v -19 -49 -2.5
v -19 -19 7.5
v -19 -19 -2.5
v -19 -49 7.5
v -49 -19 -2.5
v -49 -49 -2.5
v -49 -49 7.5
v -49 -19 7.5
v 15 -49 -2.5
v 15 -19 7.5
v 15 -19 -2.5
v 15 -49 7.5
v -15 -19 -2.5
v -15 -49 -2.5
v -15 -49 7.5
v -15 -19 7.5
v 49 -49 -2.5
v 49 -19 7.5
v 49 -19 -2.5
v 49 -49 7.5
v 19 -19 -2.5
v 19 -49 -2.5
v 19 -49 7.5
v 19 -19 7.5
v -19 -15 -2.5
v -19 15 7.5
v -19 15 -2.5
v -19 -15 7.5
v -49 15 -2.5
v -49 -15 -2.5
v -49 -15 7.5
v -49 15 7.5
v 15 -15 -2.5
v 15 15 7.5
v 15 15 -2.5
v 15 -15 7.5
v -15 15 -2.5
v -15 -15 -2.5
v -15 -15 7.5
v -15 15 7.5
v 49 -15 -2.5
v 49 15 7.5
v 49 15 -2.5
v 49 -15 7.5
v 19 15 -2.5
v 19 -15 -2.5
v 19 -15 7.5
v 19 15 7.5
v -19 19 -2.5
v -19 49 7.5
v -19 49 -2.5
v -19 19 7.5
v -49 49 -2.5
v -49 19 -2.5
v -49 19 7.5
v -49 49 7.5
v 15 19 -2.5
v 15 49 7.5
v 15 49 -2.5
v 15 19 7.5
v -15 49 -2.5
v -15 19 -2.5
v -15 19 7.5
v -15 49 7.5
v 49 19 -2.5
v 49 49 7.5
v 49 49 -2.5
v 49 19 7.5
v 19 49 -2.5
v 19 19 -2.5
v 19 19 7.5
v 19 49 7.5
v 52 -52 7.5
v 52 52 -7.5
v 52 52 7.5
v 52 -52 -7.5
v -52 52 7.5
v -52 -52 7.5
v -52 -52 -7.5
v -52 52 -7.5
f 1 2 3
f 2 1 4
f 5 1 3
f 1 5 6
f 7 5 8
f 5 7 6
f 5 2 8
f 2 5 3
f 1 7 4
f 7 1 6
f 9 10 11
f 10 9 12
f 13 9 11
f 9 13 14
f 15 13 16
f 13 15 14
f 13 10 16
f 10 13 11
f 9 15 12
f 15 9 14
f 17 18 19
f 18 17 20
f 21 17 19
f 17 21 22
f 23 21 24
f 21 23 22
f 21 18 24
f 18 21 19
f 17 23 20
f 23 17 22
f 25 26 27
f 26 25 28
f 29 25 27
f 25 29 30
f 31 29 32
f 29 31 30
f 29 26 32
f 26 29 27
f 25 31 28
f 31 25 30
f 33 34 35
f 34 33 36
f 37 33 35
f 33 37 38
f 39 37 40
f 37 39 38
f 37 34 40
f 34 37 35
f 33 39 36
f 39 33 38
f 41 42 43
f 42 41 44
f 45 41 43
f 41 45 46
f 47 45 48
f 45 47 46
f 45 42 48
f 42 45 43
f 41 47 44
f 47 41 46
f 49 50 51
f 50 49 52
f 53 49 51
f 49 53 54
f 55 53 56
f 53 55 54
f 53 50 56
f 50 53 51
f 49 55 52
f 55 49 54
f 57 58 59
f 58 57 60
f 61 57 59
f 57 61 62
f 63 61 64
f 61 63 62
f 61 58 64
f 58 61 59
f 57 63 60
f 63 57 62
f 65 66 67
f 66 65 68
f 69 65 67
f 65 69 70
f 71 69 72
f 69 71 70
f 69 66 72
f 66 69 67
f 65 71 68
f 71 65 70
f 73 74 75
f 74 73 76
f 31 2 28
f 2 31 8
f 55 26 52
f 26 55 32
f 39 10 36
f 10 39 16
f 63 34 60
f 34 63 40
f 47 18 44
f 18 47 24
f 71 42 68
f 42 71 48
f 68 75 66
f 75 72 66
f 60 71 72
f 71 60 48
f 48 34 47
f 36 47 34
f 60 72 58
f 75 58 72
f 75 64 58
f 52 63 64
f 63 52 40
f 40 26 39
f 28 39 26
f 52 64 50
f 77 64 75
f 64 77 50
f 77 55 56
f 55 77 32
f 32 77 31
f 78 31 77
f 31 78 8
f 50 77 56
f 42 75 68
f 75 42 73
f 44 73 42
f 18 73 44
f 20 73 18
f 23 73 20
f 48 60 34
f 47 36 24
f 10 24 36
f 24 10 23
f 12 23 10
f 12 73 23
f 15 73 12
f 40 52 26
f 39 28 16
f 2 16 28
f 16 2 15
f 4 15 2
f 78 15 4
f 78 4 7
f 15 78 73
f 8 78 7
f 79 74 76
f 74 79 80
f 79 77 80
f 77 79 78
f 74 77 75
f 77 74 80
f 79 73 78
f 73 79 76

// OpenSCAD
$fn = 32;

// ----------------------------------------------------------------------
// Pocket plate 104 x 104 x 15
// 3 x 3 pockets 30 mm square, 10 mm deep
// ----------------------------------------------------------------------

// --- parameters (mm) ---
thickness = 15;  // plate thickness
seat_tol = 0.1;  // tolerance at the seating features
free_tol = 0.3;  // general tolerance on the free sizes
floor_t = 5;     // material left under each pocket
pocket = 30;     // pocket side length
pitch_x = 34;    // pocket pitch along X
pitch_y = 34;    // pocket pitch along Y
cols = 3;        // pockets per row
rows = 3;        // rows of pockets

// --- derived feature positions (mm) ---
depth = thickness - floor_t;        // = 10   pocket depth, down to the floor
span_x = (cols - 1) * pitch_x;      // = 68   distance between outer pockets
span_y = (rows - 1) * pitch_y;      // = 68   distance between outer pocket rows
origin_x = -span_x / 2;             // = -34   X of the first pocket
origin_y = -span_y / 2;             // = -34   Y of the first pocket
plate = [span_x + pocket + 6, span_y + pocket + 6, thickness];  // = [104, 104, 15]   overall size: pockets plus 3 mm of wall on each side
feature_centers = [
  [origin_x + 0 * pitch_x, origin_y + 0 * pitch_y],
  [origin_x + 1 * pitch_x, origin_y + 0 * pitch_y],
  [origin_x + 2 * pitch_x, origin_y + 0 * pitch_y],
  [origin_x + 0 * pitch_x, origin_y + 1 * pitch_y],
  [origin_x + 1 * pitch_x, origin_y + 1 * pitch_y],
  [origin_x + 2 * pitch_x, origin_y + 1 * pitch_y],
  [origin_x + 0 * pitch_x, origin_y + 2 * pitch_y],
  [origin_x + 1 * pitch_x, origin_y + 2 * pitch_y],
  [origin_x + 2 * pitch_x, origin_y + 2 * pitch_y]
];   // pocket centres, used verbatim by the cutter loop

// plate outline, then one pocket per centre in feature_centers
difference() {
  cube(plate, center = true);
  for (centre = feature_centers)
    translate([centre[0] - pocket / 2, centre[1] - pocket / 2, plate[2] / 2 - depth])
      cube([pocket, pocket, depth + 1]);  // centred on the declared pocket centre
}
